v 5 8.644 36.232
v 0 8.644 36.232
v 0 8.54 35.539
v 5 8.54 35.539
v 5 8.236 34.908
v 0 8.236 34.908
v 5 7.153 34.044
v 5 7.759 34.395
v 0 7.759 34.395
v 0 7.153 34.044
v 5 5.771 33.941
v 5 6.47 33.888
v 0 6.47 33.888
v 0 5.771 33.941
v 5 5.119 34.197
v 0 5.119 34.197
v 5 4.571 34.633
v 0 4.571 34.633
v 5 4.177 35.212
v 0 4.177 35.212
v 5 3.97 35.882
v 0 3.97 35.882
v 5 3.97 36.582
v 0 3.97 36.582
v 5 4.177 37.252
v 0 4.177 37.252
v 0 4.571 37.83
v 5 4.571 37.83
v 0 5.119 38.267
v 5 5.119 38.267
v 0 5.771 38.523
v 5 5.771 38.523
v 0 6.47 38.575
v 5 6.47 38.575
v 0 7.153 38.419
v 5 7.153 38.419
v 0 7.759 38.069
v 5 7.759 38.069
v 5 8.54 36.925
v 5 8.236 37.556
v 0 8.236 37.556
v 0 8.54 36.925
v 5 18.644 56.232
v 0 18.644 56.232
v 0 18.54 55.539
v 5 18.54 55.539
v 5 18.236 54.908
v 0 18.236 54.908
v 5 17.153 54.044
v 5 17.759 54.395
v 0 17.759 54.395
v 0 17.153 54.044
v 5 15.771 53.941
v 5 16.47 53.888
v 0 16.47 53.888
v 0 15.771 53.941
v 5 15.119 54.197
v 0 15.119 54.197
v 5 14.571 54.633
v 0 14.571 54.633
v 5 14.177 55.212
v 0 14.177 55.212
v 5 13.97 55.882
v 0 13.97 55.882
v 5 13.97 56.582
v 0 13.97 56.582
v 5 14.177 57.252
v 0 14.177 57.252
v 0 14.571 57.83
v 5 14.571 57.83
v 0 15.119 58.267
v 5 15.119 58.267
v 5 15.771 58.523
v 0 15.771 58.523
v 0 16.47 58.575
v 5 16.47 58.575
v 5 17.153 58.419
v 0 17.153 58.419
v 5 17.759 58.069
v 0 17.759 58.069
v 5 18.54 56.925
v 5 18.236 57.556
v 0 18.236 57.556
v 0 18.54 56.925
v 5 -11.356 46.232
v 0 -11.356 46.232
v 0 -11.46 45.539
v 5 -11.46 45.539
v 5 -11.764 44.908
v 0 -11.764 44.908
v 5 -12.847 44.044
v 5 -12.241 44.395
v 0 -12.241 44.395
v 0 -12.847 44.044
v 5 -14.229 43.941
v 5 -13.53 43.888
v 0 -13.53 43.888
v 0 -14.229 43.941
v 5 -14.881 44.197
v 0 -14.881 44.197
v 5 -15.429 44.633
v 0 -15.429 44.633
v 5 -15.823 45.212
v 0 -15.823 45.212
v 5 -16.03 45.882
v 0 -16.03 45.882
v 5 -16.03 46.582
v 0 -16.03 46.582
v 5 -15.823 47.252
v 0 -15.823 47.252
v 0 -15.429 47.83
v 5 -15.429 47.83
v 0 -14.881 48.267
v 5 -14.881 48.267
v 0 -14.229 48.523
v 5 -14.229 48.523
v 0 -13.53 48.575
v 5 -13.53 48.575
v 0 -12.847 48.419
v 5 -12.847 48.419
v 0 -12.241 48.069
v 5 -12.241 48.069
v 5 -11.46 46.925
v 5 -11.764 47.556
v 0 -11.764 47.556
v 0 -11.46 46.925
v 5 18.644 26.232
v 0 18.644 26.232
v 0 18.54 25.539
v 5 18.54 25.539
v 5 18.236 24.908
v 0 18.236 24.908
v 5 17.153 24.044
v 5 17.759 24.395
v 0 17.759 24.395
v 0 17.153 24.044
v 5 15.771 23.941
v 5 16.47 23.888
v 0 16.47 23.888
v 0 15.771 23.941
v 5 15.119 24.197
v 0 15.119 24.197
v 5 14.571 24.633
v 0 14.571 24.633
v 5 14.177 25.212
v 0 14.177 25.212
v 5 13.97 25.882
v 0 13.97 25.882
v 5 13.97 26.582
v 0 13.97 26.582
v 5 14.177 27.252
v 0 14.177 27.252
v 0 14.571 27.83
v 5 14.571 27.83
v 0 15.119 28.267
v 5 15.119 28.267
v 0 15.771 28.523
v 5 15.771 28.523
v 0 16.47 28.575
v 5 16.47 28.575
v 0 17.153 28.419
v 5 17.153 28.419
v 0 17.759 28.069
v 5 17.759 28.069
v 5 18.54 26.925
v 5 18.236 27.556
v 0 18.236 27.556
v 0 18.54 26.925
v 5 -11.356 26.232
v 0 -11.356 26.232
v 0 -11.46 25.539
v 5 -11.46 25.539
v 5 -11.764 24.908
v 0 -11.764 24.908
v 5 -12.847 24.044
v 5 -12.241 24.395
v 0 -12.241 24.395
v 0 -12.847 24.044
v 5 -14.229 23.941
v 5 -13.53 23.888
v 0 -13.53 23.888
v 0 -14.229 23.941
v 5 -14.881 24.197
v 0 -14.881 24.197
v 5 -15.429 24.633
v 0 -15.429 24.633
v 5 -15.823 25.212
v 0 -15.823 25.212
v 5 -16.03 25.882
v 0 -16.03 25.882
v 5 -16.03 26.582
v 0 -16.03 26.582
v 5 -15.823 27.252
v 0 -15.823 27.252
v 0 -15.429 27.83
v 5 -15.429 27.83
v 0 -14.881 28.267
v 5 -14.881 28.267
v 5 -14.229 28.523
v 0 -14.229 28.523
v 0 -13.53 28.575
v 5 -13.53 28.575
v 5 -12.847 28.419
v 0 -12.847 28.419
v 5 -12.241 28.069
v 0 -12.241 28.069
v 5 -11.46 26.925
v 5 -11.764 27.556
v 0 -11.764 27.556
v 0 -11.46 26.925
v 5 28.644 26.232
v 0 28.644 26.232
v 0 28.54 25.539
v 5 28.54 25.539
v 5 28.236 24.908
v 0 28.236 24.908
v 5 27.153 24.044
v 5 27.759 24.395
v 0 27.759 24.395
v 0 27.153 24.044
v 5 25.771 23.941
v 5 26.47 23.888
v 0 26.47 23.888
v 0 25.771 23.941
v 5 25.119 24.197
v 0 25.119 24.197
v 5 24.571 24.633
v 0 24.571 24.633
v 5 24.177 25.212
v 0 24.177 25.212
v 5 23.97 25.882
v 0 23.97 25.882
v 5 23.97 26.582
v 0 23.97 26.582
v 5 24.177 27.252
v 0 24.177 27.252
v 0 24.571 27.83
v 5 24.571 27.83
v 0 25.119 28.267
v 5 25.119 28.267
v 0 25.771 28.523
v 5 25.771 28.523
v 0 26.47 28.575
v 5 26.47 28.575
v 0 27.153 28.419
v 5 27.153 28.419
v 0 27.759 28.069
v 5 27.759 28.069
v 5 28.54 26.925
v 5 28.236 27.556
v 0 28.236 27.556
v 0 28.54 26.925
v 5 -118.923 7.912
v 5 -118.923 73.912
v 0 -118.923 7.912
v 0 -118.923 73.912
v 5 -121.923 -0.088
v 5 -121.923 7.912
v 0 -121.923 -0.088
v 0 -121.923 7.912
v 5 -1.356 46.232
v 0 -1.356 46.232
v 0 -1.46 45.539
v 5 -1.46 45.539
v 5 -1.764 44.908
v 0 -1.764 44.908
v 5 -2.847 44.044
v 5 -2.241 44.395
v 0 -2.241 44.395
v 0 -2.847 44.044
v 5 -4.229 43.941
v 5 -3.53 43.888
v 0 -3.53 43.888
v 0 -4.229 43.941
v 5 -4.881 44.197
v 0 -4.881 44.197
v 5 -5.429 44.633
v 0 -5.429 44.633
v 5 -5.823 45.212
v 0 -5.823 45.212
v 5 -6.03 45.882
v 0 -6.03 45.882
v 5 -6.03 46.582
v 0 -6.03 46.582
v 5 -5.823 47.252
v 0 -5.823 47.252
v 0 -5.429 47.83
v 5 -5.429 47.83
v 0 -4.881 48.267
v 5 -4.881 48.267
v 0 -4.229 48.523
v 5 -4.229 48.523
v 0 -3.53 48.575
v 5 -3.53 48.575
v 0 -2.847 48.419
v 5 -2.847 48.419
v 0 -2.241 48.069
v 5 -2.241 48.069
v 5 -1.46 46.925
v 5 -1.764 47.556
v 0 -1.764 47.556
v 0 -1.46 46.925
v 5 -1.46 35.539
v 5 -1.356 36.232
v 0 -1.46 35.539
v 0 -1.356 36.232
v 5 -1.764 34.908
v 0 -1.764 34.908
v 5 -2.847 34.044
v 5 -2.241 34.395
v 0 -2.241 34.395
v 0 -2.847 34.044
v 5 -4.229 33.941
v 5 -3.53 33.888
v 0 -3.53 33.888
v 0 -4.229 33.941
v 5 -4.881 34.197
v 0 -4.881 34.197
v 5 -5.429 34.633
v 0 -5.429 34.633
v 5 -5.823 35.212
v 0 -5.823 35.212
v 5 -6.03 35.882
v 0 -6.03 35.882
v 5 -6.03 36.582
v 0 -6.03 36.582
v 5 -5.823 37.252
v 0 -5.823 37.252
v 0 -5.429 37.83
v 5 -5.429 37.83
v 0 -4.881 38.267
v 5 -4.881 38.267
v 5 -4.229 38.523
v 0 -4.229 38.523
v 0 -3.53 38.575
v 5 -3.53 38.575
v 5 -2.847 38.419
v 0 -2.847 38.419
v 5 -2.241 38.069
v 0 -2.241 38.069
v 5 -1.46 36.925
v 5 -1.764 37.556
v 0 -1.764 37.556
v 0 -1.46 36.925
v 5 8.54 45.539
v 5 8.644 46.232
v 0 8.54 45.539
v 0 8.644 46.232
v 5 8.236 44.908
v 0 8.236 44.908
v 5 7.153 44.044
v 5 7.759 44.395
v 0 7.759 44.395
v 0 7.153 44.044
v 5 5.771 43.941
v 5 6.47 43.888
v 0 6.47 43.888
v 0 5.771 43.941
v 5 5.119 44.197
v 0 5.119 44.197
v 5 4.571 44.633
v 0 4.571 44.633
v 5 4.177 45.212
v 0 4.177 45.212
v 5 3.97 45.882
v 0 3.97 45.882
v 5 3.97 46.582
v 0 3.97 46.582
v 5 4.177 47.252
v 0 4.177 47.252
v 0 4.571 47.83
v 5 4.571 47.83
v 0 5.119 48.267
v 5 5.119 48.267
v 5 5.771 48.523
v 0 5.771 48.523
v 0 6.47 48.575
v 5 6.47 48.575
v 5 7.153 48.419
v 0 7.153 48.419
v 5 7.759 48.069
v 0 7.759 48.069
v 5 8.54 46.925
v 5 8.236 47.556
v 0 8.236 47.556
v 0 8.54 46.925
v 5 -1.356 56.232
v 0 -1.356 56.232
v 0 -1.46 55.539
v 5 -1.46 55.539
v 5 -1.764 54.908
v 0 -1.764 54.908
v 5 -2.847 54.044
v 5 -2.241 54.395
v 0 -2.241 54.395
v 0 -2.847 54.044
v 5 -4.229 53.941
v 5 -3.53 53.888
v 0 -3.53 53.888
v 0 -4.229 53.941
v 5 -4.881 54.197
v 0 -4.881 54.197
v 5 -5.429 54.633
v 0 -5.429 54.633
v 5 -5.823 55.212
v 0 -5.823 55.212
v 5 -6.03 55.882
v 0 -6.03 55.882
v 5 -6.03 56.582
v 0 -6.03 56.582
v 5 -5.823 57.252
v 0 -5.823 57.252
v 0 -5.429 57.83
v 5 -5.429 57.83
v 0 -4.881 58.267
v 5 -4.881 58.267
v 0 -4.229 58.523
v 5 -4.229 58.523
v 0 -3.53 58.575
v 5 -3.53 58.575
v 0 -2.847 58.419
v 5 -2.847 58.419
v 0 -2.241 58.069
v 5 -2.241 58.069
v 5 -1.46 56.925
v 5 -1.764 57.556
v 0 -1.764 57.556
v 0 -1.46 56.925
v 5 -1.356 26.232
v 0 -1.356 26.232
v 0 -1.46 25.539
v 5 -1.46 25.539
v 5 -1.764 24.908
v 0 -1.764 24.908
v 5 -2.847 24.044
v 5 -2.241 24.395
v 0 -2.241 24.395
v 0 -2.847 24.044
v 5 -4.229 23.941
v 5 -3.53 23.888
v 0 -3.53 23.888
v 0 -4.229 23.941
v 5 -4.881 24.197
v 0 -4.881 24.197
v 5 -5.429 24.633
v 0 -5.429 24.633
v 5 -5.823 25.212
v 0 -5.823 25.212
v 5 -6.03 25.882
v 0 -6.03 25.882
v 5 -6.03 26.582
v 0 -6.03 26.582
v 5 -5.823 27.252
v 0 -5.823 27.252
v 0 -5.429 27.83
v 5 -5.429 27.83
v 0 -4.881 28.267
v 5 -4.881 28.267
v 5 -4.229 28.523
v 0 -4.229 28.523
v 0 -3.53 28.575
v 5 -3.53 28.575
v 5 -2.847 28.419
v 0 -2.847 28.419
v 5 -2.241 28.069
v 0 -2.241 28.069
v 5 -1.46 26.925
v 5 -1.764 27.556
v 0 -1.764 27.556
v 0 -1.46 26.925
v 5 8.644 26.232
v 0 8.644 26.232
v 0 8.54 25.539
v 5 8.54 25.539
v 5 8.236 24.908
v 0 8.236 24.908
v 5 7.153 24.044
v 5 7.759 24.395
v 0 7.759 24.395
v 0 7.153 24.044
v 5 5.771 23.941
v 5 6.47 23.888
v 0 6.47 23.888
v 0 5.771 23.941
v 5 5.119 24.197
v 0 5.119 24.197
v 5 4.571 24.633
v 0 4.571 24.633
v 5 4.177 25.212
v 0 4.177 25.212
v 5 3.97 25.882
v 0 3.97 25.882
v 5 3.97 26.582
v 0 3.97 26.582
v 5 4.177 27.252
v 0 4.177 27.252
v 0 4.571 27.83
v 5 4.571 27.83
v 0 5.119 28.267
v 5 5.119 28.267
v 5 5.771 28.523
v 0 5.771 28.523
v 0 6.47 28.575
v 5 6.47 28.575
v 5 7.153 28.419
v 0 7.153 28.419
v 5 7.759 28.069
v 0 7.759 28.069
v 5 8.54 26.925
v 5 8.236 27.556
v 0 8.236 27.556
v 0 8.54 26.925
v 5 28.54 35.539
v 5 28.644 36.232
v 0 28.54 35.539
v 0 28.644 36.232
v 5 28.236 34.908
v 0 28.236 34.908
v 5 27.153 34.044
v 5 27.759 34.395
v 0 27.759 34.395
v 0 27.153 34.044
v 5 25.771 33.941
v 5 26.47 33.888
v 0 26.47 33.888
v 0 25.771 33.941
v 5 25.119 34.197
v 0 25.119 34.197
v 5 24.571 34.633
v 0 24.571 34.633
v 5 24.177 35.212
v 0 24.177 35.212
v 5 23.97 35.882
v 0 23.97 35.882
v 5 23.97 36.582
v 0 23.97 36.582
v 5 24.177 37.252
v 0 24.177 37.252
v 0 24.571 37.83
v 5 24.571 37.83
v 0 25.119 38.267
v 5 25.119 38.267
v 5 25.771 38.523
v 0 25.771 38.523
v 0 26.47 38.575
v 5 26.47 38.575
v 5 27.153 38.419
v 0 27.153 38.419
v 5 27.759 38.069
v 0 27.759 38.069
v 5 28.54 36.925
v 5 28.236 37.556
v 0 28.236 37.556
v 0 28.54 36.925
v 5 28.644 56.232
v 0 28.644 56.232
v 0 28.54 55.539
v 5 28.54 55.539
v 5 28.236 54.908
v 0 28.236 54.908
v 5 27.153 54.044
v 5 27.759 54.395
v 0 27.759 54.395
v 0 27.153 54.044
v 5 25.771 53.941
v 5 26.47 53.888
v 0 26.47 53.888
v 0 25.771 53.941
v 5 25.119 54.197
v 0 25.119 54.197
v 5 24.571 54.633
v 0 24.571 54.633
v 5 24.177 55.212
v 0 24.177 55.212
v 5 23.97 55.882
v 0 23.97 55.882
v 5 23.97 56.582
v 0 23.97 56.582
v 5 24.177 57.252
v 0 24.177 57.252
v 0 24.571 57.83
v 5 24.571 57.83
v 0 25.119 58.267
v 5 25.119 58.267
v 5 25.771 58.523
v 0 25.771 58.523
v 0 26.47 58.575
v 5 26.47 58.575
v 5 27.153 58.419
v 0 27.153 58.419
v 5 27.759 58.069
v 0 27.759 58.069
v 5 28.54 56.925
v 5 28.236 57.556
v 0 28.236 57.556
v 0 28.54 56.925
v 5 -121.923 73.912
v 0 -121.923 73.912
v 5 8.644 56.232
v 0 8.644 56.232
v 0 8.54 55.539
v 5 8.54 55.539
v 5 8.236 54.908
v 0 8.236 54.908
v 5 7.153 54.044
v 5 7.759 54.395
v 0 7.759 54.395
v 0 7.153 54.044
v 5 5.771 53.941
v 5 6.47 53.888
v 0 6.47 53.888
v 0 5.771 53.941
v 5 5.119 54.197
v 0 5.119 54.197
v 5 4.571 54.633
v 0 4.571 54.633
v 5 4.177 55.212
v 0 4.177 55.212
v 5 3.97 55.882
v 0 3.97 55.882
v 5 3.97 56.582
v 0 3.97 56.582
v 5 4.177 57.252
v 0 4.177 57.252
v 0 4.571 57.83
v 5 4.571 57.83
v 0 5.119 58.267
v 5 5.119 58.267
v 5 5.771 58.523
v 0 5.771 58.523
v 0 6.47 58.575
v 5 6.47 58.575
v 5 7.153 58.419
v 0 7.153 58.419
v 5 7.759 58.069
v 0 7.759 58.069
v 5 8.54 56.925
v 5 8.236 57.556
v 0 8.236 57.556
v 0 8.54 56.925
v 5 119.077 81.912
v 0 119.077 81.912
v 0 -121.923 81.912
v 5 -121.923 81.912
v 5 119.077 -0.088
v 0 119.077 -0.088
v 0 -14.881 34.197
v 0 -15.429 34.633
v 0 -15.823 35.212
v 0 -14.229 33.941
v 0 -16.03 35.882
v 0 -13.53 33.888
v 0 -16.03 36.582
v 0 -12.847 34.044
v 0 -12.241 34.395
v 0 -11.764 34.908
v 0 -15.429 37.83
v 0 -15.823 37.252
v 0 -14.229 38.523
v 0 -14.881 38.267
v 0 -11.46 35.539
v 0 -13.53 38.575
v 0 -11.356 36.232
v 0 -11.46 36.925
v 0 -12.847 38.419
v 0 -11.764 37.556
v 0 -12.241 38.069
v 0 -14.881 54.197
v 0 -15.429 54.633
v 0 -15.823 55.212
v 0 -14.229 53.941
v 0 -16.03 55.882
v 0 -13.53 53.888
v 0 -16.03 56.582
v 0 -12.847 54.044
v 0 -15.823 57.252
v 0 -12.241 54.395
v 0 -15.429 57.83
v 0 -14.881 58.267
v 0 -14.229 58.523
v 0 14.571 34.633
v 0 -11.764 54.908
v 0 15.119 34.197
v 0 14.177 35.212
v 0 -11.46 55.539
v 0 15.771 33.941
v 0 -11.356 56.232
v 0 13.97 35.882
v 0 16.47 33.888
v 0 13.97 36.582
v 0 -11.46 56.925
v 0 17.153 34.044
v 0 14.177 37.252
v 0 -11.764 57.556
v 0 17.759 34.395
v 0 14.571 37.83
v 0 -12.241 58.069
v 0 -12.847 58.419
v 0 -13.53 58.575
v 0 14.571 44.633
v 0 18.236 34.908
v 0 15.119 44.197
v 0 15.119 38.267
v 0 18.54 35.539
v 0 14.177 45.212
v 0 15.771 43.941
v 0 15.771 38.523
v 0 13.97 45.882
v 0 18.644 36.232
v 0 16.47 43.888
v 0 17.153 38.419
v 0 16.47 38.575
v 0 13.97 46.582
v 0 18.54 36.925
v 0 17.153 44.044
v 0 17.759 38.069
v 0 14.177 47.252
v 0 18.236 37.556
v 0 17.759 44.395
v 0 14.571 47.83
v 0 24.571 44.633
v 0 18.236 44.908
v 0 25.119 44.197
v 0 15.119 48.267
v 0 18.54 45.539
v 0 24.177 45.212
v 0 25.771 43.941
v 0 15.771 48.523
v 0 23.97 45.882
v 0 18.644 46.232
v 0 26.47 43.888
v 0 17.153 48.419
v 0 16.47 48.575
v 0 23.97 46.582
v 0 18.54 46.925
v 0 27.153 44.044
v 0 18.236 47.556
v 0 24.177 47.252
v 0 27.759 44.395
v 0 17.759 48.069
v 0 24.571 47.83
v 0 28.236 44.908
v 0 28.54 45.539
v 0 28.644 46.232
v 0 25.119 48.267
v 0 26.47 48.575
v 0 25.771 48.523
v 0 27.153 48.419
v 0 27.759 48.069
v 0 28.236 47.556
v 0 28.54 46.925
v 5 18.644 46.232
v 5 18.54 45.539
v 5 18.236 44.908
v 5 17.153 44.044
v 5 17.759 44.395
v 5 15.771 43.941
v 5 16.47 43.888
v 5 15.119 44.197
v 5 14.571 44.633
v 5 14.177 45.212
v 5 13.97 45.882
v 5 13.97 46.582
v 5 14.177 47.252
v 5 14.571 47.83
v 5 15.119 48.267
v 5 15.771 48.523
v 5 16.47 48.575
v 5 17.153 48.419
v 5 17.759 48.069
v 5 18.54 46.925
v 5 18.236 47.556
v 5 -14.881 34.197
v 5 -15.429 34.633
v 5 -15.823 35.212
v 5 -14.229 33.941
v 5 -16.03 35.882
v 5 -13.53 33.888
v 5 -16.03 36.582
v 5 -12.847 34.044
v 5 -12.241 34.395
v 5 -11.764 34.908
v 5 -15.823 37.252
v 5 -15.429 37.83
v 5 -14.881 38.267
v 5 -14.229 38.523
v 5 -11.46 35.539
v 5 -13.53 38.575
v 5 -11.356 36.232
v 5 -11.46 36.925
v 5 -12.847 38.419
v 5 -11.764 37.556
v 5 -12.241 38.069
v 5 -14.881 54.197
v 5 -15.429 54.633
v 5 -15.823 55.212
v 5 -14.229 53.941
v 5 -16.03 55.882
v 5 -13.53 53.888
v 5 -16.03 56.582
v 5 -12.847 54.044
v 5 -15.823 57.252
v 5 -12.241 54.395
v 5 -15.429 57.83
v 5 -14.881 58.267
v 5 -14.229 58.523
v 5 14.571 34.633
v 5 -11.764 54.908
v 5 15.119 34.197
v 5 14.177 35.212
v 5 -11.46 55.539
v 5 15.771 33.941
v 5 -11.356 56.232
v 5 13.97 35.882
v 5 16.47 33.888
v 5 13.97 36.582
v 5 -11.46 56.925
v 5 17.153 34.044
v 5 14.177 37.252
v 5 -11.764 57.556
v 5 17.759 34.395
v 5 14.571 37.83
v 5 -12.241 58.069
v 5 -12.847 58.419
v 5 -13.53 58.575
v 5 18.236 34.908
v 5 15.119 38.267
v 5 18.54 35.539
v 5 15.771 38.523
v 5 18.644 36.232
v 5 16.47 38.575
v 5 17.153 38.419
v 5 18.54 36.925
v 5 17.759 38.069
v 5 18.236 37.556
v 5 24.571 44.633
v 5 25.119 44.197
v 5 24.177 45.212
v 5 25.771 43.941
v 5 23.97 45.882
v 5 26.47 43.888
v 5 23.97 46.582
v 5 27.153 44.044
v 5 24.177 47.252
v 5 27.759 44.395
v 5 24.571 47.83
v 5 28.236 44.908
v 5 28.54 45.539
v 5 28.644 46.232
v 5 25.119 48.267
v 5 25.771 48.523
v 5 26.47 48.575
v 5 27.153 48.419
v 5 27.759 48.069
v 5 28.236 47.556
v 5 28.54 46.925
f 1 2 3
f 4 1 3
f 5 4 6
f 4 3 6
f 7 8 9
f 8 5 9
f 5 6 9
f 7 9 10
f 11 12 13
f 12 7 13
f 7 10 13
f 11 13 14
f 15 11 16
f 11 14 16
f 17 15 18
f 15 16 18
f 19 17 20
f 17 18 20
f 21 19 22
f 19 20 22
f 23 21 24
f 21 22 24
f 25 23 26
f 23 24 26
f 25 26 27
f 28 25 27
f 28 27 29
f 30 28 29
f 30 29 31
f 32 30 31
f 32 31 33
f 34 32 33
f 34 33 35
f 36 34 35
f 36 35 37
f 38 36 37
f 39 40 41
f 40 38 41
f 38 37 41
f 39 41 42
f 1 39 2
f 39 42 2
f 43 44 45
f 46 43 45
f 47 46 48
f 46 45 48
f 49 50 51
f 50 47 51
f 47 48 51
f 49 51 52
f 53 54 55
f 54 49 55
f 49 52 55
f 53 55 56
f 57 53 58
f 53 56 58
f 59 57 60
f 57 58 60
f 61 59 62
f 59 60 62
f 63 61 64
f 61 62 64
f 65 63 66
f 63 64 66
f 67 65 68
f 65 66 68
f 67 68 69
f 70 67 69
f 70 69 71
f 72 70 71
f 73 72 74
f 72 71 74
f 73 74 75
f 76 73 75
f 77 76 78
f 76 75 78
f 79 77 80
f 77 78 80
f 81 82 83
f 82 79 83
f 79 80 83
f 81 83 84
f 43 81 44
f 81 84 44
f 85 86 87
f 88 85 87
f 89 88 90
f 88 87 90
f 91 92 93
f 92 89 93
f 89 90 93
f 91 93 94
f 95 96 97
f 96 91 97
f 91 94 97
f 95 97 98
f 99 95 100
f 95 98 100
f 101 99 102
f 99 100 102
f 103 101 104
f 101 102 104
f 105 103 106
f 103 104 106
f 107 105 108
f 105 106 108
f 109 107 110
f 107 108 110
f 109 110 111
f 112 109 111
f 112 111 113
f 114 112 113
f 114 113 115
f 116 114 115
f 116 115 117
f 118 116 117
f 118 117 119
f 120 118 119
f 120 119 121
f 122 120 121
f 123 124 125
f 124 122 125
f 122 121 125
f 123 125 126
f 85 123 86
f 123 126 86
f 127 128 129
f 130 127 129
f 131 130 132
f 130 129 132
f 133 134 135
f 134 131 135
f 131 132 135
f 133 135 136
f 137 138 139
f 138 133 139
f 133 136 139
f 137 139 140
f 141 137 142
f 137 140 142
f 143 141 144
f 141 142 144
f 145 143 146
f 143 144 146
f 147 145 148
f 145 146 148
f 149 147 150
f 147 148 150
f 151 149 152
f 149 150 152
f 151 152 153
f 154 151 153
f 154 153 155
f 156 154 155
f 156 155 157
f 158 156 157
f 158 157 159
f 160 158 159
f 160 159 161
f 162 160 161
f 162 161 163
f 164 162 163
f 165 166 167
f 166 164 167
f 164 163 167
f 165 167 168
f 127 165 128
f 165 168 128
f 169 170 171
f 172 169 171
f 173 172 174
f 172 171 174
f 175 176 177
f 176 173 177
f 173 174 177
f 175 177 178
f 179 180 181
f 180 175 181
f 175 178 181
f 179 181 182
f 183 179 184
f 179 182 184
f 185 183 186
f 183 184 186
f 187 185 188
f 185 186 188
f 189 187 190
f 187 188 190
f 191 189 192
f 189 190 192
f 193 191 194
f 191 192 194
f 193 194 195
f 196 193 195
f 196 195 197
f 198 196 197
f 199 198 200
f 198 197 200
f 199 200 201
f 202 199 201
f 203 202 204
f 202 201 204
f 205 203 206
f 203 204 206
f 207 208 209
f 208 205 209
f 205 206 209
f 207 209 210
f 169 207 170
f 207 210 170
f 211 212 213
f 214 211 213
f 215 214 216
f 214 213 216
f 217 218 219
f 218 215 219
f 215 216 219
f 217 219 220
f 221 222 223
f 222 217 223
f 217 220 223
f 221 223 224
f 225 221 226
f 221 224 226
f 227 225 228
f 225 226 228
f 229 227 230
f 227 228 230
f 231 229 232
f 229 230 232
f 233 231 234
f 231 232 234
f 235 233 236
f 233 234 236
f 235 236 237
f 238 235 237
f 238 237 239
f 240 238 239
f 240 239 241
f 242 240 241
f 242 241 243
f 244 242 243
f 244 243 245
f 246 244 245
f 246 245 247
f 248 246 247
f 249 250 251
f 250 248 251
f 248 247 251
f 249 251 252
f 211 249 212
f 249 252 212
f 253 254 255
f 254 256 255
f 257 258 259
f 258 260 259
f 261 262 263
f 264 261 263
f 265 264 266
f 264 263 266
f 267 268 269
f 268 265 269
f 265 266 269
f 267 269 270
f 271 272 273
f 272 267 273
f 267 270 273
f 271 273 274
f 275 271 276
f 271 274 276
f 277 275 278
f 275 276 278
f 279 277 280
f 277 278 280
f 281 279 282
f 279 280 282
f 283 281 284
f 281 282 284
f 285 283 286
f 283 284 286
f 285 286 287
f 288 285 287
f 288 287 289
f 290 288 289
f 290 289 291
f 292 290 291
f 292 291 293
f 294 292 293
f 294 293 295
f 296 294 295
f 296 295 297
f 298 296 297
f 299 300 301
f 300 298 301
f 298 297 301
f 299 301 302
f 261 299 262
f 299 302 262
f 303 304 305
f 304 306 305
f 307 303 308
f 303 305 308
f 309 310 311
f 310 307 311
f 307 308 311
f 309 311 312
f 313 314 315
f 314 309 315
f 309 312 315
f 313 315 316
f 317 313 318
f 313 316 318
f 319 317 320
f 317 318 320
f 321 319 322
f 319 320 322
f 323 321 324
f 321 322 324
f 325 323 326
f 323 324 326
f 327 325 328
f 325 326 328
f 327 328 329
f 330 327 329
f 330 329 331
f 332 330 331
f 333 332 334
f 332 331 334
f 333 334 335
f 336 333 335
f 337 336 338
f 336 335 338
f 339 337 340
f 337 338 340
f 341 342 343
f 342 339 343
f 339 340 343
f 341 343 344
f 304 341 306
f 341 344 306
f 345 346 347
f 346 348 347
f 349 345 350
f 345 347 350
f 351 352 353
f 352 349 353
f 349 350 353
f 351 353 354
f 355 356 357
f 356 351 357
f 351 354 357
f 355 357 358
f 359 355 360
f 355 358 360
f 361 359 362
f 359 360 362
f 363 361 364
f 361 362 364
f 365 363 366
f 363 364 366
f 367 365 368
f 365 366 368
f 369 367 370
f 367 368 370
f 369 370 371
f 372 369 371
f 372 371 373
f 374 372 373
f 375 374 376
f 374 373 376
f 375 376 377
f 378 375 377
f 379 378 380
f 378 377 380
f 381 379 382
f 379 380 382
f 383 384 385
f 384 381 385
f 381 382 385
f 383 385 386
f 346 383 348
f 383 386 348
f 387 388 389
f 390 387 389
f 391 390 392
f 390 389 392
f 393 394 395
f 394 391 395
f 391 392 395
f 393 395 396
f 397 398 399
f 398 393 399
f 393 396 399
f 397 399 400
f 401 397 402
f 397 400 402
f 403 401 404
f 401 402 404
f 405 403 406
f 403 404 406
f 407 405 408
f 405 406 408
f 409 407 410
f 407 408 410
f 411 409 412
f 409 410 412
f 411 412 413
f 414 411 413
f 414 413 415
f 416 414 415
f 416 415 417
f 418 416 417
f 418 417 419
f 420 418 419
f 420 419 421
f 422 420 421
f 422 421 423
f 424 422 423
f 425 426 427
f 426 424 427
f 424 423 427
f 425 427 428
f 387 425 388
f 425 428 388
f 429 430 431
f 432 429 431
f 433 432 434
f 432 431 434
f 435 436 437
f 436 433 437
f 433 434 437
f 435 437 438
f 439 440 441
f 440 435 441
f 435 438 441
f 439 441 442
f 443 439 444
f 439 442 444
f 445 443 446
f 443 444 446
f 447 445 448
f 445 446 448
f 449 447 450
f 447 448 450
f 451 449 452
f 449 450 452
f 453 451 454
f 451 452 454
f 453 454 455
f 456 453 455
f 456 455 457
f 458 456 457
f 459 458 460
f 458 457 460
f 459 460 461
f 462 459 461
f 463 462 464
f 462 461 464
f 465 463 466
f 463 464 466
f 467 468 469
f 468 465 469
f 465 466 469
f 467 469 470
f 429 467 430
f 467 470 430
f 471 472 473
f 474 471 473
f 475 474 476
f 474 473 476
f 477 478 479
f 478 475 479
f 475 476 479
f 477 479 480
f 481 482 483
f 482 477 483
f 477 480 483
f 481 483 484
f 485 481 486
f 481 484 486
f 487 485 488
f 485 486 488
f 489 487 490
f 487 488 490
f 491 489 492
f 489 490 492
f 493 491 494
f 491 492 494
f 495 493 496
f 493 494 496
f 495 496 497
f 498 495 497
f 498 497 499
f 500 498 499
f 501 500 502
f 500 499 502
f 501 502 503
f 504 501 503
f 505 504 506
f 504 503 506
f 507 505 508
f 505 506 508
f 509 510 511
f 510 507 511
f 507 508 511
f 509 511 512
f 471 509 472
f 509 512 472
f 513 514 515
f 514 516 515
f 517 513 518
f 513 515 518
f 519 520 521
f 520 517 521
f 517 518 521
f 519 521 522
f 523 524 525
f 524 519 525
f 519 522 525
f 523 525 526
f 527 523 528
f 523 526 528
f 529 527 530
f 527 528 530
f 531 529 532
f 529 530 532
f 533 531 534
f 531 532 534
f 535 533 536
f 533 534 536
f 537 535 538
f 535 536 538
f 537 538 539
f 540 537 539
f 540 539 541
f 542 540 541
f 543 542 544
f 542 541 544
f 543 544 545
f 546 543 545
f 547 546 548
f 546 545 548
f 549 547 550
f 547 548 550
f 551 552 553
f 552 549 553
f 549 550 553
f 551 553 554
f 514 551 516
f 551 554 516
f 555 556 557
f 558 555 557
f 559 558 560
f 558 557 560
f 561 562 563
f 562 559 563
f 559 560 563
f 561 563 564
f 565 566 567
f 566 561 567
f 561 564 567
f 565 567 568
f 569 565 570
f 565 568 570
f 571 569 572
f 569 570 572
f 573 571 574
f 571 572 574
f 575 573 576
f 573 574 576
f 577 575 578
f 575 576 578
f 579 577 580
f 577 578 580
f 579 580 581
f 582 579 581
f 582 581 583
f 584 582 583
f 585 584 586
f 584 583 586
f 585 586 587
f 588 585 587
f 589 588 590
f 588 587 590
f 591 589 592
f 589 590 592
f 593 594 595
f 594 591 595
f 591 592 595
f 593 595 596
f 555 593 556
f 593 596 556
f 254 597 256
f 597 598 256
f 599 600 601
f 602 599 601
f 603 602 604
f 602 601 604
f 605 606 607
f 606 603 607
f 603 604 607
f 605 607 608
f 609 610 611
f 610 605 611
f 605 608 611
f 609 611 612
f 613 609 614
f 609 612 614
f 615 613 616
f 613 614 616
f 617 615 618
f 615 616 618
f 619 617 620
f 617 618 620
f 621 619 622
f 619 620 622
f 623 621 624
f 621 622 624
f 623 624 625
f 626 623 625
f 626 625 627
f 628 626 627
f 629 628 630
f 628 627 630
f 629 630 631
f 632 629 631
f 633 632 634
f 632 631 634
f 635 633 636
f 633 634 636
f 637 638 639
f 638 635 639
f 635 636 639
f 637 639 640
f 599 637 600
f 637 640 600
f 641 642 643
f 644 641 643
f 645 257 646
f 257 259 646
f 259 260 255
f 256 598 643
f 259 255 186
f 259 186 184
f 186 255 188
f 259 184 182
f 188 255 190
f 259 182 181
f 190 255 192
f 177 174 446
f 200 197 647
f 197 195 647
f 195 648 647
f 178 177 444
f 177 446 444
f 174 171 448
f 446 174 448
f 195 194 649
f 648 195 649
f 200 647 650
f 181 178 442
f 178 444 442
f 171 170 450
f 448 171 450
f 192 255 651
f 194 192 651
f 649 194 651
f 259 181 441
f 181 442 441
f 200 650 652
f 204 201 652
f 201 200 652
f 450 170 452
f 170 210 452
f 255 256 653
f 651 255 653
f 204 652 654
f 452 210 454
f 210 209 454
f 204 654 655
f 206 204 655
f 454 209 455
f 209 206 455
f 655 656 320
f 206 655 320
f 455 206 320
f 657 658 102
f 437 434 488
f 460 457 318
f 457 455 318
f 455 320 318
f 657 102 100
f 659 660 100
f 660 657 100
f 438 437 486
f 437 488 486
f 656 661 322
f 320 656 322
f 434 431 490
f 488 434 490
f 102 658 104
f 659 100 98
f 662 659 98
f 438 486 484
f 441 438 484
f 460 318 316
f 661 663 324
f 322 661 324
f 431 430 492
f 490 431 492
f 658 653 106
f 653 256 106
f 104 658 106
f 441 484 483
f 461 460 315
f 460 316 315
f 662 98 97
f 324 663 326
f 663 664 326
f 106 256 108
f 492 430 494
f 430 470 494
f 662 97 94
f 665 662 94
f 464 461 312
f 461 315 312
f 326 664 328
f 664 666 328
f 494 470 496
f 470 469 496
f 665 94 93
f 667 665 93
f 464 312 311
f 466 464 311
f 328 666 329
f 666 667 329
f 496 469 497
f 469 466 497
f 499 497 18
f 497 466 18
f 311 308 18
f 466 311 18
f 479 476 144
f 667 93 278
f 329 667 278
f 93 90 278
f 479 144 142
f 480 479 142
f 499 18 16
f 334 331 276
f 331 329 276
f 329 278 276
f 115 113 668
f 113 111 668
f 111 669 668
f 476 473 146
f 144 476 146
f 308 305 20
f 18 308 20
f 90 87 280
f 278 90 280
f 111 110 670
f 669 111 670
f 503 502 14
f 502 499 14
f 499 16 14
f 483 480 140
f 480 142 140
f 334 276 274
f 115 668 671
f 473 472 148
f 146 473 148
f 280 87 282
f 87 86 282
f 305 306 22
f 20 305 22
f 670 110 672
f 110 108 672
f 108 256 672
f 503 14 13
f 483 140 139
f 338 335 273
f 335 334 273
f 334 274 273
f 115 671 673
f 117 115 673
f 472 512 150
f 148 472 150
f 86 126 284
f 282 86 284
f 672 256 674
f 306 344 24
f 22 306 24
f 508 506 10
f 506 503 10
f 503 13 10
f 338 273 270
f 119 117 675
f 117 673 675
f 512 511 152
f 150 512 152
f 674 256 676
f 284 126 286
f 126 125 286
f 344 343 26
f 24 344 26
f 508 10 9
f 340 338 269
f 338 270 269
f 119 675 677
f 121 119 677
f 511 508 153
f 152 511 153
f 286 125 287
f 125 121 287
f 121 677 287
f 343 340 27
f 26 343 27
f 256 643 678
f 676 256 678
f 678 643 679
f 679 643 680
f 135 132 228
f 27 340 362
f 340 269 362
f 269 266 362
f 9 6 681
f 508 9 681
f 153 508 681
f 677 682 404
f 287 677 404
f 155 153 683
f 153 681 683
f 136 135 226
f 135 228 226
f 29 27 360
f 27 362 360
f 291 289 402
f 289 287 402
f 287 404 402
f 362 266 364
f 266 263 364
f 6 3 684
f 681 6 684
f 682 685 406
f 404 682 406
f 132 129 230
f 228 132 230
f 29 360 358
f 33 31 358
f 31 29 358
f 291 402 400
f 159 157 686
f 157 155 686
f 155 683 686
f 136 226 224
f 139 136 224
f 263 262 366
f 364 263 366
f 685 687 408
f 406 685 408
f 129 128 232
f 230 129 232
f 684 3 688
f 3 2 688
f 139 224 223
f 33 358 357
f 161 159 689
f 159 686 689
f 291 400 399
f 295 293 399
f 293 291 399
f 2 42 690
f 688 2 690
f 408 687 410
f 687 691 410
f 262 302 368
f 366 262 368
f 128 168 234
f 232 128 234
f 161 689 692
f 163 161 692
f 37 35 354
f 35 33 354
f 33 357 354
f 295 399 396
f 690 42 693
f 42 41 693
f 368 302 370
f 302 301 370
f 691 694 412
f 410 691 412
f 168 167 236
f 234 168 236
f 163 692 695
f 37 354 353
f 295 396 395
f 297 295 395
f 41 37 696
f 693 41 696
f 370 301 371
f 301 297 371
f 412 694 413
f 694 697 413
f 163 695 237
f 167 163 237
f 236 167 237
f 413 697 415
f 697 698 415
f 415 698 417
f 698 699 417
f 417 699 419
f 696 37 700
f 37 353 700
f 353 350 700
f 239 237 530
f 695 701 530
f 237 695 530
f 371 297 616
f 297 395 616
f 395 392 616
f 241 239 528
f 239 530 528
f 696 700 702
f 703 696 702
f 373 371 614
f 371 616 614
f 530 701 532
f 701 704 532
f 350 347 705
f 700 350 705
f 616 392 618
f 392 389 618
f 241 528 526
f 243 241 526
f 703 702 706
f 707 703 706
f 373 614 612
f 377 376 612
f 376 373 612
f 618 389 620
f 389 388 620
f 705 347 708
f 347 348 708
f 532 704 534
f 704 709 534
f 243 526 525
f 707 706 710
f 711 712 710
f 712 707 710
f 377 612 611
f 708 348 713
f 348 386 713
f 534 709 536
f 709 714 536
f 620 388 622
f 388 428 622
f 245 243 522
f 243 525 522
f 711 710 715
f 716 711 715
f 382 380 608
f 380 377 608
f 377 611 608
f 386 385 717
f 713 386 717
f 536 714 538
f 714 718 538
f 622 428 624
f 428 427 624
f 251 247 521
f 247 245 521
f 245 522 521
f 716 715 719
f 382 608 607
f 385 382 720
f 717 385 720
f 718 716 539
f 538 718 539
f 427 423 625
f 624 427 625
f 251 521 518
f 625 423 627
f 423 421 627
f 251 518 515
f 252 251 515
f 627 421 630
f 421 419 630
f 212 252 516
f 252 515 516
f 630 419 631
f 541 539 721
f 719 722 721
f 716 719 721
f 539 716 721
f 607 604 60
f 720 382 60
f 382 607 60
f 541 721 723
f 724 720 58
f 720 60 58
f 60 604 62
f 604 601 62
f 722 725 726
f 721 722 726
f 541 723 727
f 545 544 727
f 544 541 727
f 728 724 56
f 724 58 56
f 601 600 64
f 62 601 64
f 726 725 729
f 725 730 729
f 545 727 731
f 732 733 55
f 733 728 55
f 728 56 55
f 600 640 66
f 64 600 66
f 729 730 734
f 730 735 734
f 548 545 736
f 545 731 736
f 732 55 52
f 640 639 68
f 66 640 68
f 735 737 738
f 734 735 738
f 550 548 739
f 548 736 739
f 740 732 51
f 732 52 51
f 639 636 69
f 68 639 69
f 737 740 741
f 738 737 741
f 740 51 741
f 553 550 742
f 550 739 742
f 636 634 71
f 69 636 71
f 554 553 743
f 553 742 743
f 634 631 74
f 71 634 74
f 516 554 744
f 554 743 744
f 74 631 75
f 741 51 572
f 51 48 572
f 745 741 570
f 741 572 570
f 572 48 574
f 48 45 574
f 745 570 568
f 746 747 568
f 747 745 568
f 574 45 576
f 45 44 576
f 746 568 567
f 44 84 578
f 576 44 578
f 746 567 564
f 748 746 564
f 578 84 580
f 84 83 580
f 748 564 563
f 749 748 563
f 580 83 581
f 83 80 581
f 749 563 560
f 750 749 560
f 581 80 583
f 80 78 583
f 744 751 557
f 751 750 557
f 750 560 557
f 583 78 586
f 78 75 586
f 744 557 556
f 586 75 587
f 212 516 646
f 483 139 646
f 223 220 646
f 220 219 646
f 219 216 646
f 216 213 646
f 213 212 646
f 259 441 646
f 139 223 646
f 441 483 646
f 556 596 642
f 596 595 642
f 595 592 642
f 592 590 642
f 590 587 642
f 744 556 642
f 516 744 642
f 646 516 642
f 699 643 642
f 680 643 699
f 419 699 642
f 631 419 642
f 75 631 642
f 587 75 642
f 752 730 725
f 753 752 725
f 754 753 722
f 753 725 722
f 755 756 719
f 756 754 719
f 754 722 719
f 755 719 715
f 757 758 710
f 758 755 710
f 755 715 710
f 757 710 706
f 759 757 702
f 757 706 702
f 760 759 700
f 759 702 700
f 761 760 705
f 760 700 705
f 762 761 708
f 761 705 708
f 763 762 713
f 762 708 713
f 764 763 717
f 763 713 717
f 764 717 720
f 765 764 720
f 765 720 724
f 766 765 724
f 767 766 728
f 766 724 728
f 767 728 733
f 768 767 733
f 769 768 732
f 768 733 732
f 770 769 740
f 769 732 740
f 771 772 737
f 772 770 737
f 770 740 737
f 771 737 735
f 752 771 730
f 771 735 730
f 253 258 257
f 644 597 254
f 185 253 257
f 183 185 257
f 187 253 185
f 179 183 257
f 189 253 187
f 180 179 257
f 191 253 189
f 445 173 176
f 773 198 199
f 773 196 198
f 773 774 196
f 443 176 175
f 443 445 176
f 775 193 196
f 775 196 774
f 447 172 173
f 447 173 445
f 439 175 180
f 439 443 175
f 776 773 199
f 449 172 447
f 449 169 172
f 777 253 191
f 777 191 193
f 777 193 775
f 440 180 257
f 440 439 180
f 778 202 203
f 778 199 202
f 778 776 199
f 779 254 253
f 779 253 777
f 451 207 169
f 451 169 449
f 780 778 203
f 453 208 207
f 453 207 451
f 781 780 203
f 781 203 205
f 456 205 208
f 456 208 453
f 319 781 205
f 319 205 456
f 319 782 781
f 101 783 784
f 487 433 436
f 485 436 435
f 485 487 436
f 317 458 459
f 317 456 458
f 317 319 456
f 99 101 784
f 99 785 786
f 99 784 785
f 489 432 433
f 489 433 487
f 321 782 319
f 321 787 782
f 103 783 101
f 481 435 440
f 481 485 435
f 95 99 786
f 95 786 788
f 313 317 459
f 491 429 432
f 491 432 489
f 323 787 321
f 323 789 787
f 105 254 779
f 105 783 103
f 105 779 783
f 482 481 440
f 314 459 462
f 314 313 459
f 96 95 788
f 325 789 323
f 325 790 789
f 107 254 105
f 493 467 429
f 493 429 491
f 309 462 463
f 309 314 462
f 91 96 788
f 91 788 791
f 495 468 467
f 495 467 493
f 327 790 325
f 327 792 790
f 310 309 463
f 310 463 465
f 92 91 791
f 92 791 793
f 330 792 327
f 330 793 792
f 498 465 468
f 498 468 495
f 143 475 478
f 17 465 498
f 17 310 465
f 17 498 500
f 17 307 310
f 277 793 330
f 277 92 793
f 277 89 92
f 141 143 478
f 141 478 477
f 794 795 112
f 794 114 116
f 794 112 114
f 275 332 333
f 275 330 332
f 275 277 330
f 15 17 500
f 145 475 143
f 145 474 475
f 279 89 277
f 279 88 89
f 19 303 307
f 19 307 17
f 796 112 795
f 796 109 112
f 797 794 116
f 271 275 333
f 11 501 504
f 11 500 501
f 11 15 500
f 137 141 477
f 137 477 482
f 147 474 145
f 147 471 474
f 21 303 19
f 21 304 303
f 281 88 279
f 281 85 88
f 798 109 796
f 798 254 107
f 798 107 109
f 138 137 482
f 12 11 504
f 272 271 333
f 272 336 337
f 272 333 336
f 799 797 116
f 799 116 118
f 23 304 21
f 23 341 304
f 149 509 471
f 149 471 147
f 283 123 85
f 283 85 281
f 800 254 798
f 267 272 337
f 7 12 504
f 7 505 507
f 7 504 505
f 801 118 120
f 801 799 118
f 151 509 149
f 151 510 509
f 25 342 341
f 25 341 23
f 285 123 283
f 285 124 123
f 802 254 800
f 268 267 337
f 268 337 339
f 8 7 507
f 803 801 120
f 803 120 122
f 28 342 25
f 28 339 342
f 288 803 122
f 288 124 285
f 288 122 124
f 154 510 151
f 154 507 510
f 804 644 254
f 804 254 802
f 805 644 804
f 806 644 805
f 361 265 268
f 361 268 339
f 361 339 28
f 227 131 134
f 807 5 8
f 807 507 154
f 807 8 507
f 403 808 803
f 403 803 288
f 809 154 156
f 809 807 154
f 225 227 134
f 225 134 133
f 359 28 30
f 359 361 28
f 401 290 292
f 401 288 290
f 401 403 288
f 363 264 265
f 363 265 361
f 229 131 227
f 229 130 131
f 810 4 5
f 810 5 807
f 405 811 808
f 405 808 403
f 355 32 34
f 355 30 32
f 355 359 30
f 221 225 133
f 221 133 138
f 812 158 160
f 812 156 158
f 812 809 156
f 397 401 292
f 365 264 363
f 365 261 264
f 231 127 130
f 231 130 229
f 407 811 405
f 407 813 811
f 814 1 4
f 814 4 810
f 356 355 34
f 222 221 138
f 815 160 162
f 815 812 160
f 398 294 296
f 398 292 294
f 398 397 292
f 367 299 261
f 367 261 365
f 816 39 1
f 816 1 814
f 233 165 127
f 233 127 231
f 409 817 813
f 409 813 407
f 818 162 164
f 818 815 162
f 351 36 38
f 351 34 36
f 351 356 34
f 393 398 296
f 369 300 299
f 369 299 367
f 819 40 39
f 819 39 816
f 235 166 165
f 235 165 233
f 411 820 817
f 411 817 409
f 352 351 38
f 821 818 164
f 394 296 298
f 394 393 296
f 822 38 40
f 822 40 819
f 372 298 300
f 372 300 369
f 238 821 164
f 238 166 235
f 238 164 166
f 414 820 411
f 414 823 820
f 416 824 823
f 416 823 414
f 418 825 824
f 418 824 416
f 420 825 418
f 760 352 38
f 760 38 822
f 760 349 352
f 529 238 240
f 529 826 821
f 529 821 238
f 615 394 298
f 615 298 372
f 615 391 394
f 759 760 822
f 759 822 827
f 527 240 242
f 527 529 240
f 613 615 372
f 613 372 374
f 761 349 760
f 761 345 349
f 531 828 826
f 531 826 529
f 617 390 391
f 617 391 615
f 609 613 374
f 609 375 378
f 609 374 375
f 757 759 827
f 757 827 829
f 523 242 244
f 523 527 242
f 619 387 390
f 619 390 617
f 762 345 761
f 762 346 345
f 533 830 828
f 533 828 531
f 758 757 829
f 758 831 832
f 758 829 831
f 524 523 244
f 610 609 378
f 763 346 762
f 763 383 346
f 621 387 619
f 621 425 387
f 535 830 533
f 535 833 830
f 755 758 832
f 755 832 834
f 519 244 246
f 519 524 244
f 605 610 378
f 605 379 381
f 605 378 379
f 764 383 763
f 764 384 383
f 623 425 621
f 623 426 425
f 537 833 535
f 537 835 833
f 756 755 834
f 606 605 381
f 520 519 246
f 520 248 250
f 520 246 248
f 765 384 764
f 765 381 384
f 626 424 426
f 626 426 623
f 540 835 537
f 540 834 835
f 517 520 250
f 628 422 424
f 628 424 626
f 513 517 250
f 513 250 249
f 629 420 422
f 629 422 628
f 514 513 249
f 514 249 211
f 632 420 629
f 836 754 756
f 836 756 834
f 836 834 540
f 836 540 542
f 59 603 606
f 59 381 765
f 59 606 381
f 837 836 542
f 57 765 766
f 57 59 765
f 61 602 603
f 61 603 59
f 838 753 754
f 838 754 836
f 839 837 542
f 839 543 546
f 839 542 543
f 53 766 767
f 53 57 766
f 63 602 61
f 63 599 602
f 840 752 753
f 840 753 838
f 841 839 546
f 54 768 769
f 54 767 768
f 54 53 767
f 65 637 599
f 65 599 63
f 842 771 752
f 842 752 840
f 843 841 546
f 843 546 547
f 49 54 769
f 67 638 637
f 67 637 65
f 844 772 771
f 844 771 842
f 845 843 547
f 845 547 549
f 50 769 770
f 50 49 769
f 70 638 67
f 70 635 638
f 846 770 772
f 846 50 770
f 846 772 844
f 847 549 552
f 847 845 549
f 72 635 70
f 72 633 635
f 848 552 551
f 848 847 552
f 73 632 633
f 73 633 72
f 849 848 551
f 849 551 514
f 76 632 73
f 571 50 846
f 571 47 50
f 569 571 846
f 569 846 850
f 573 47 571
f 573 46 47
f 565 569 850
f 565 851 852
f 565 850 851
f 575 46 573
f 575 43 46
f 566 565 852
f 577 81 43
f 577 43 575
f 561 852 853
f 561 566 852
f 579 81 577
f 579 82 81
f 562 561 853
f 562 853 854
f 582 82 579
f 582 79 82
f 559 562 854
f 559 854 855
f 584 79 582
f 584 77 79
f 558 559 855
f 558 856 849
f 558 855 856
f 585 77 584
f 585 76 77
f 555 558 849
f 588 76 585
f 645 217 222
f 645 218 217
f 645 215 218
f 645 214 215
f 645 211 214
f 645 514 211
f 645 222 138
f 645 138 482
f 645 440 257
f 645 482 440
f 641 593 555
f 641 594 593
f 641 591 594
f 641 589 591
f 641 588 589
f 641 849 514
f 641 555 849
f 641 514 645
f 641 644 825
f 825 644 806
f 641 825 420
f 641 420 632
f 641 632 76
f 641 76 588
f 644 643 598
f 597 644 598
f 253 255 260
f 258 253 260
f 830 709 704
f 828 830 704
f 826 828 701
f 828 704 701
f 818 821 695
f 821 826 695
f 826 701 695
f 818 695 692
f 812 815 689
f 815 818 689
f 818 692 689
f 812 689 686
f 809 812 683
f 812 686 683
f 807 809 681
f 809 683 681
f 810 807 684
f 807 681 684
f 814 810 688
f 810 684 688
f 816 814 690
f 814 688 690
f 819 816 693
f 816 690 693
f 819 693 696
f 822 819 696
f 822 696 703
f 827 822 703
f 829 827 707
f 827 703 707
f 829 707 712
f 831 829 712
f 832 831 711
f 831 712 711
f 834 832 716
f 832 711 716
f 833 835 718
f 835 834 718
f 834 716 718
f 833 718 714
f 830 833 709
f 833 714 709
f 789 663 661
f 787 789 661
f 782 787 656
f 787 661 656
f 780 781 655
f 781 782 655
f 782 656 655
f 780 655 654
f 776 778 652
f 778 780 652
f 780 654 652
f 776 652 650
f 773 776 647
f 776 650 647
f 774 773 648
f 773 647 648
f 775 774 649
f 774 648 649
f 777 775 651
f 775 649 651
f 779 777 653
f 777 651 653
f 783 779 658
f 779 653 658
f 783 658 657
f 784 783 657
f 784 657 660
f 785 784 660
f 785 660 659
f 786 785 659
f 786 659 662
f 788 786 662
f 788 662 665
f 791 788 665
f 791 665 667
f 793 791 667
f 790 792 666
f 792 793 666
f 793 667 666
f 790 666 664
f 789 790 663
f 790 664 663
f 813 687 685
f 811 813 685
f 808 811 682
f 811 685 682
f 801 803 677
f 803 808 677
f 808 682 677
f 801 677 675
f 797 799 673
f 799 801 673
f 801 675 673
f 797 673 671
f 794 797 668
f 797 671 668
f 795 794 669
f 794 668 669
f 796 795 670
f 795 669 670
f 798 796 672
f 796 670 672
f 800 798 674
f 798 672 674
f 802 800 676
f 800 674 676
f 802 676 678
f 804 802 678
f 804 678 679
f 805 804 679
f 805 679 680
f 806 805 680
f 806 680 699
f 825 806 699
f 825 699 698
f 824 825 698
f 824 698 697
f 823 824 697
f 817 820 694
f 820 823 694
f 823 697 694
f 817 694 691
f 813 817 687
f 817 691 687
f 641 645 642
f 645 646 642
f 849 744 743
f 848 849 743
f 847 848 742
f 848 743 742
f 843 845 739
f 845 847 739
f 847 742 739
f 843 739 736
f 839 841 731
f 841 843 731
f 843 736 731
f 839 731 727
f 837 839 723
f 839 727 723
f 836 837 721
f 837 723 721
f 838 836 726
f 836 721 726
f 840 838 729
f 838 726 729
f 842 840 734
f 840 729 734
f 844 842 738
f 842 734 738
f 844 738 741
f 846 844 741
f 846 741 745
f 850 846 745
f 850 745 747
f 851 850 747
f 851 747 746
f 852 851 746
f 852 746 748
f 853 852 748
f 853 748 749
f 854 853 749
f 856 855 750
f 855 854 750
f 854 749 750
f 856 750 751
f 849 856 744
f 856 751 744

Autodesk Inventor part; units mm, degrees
ref_plane "YZ Plane" through (0, 0, 0) normal (1, 0, 0) x (0, 1, 0)
ref_plane "XZ Plane" through (0, 0, 0) normal (0, 1, 0) x (-1, 0, 0)
ref_plane "XY Plane" through (0, 0, 0) normal (0, 0, 1) x (1, 0, 0)
sketch "Sketch1" plane through (0, 0, 0) normal (1, 0, 0) x (0, 1, 0)
  line L0 (119.0767, 81.9121) -> (-121.9233, 81.9121)
  line L1 (-121.9233, 81.9121) -> (-121.9233, -0.0879)
  line L2 (-121.9233, -0.0879) -> (119.0767, -0.0879)
  line L3 (119.0767, -0.0879) -> (119.0767, 81.9121)
  circle A0 centre (-54.9233, 40.9121) radius 19
  line L4 (-121.9233, 73.9121) -> (-118.9233, 73.9121)
  line L5 (-118.9233, 73.9121) -> (-118.9233, 7.9121)
  line L6 (-118.9233, 7.9121) -> (-121.9233, 7.9121)
  line L7 (-121.9233, 7.9121) -> (-121.9233, 73.9121)
  circle A1 centre (26.2941, 56.2319) radius 2.35
  circle A2 centre (16.2941, 56.2319) radius 2.35
  circle A3 centre (6.2941, 56.2319) radius 2.35
  circle A4 centre (-3.7059, 56.2319) radius 2.35
  circle A5 centre (-13.7059, 56.2319) radius 2.35
  circle A6 centre (26.2941, 46.2319) radius 2.35
  circle A7 centre (16.2941, 46.2319) radius 2.35
  circle A8 centre (6.2941, 46.2319) radius 2.35
  circle A9 centre (-3.7059, 46.2319) radius 2.35
  circle A10 centre (-13.7059, 46.2319) radius 2.35
  circle A11 centre (26.2941, 36.2319) radius 2.35
  circle A12 centre (16.2941, 36.2319) radius 2.35
  circle A13 centre (6.2941, 36.2319) radius 2.35
  circle A14 centre (-3.7059, 36.2319) radius 2.35
  circle A15 centre (-13.7059, 36.2319) radius 2.35
  circle A16 centre (26.2941, 26.2319) radius 2.35
  circle A17 centre (16.2941, 26.2319) radius 2.35
  circle A18 centre (6.2941, 26.2319) radius 2.35
  circle A19 centre (-3.7059, 26.2319) radius 2.35
  circle A20 centre (-13.7059, 26.2319) radius 2.35
  point P0 (0, 0)
  point P1 (0, 0)
  dimension "d0" = 241
  dimension "d1" = 82
  dimension "d2" = 38
  dimension "d3" = 41
  dimension "d4" = 174
  dimension "d5" = 66
  dimension "d6" = 3
  dimension "d7" = 8
  dimension "d21" = 4.7
  dimension "d24" = 10
  dimension "d27" = 10
extrude "Extrusion1" add sketch "Sketch1" along normal blind 5 contours L3 L2 L1 L6 L5 L4 L0 | A0
equation "\"d3\" = 0.5 * d1"
equation "\"d7\" = -0.5 * d5 + 0.5 * d1"
properties part number "inner_2Poke"
